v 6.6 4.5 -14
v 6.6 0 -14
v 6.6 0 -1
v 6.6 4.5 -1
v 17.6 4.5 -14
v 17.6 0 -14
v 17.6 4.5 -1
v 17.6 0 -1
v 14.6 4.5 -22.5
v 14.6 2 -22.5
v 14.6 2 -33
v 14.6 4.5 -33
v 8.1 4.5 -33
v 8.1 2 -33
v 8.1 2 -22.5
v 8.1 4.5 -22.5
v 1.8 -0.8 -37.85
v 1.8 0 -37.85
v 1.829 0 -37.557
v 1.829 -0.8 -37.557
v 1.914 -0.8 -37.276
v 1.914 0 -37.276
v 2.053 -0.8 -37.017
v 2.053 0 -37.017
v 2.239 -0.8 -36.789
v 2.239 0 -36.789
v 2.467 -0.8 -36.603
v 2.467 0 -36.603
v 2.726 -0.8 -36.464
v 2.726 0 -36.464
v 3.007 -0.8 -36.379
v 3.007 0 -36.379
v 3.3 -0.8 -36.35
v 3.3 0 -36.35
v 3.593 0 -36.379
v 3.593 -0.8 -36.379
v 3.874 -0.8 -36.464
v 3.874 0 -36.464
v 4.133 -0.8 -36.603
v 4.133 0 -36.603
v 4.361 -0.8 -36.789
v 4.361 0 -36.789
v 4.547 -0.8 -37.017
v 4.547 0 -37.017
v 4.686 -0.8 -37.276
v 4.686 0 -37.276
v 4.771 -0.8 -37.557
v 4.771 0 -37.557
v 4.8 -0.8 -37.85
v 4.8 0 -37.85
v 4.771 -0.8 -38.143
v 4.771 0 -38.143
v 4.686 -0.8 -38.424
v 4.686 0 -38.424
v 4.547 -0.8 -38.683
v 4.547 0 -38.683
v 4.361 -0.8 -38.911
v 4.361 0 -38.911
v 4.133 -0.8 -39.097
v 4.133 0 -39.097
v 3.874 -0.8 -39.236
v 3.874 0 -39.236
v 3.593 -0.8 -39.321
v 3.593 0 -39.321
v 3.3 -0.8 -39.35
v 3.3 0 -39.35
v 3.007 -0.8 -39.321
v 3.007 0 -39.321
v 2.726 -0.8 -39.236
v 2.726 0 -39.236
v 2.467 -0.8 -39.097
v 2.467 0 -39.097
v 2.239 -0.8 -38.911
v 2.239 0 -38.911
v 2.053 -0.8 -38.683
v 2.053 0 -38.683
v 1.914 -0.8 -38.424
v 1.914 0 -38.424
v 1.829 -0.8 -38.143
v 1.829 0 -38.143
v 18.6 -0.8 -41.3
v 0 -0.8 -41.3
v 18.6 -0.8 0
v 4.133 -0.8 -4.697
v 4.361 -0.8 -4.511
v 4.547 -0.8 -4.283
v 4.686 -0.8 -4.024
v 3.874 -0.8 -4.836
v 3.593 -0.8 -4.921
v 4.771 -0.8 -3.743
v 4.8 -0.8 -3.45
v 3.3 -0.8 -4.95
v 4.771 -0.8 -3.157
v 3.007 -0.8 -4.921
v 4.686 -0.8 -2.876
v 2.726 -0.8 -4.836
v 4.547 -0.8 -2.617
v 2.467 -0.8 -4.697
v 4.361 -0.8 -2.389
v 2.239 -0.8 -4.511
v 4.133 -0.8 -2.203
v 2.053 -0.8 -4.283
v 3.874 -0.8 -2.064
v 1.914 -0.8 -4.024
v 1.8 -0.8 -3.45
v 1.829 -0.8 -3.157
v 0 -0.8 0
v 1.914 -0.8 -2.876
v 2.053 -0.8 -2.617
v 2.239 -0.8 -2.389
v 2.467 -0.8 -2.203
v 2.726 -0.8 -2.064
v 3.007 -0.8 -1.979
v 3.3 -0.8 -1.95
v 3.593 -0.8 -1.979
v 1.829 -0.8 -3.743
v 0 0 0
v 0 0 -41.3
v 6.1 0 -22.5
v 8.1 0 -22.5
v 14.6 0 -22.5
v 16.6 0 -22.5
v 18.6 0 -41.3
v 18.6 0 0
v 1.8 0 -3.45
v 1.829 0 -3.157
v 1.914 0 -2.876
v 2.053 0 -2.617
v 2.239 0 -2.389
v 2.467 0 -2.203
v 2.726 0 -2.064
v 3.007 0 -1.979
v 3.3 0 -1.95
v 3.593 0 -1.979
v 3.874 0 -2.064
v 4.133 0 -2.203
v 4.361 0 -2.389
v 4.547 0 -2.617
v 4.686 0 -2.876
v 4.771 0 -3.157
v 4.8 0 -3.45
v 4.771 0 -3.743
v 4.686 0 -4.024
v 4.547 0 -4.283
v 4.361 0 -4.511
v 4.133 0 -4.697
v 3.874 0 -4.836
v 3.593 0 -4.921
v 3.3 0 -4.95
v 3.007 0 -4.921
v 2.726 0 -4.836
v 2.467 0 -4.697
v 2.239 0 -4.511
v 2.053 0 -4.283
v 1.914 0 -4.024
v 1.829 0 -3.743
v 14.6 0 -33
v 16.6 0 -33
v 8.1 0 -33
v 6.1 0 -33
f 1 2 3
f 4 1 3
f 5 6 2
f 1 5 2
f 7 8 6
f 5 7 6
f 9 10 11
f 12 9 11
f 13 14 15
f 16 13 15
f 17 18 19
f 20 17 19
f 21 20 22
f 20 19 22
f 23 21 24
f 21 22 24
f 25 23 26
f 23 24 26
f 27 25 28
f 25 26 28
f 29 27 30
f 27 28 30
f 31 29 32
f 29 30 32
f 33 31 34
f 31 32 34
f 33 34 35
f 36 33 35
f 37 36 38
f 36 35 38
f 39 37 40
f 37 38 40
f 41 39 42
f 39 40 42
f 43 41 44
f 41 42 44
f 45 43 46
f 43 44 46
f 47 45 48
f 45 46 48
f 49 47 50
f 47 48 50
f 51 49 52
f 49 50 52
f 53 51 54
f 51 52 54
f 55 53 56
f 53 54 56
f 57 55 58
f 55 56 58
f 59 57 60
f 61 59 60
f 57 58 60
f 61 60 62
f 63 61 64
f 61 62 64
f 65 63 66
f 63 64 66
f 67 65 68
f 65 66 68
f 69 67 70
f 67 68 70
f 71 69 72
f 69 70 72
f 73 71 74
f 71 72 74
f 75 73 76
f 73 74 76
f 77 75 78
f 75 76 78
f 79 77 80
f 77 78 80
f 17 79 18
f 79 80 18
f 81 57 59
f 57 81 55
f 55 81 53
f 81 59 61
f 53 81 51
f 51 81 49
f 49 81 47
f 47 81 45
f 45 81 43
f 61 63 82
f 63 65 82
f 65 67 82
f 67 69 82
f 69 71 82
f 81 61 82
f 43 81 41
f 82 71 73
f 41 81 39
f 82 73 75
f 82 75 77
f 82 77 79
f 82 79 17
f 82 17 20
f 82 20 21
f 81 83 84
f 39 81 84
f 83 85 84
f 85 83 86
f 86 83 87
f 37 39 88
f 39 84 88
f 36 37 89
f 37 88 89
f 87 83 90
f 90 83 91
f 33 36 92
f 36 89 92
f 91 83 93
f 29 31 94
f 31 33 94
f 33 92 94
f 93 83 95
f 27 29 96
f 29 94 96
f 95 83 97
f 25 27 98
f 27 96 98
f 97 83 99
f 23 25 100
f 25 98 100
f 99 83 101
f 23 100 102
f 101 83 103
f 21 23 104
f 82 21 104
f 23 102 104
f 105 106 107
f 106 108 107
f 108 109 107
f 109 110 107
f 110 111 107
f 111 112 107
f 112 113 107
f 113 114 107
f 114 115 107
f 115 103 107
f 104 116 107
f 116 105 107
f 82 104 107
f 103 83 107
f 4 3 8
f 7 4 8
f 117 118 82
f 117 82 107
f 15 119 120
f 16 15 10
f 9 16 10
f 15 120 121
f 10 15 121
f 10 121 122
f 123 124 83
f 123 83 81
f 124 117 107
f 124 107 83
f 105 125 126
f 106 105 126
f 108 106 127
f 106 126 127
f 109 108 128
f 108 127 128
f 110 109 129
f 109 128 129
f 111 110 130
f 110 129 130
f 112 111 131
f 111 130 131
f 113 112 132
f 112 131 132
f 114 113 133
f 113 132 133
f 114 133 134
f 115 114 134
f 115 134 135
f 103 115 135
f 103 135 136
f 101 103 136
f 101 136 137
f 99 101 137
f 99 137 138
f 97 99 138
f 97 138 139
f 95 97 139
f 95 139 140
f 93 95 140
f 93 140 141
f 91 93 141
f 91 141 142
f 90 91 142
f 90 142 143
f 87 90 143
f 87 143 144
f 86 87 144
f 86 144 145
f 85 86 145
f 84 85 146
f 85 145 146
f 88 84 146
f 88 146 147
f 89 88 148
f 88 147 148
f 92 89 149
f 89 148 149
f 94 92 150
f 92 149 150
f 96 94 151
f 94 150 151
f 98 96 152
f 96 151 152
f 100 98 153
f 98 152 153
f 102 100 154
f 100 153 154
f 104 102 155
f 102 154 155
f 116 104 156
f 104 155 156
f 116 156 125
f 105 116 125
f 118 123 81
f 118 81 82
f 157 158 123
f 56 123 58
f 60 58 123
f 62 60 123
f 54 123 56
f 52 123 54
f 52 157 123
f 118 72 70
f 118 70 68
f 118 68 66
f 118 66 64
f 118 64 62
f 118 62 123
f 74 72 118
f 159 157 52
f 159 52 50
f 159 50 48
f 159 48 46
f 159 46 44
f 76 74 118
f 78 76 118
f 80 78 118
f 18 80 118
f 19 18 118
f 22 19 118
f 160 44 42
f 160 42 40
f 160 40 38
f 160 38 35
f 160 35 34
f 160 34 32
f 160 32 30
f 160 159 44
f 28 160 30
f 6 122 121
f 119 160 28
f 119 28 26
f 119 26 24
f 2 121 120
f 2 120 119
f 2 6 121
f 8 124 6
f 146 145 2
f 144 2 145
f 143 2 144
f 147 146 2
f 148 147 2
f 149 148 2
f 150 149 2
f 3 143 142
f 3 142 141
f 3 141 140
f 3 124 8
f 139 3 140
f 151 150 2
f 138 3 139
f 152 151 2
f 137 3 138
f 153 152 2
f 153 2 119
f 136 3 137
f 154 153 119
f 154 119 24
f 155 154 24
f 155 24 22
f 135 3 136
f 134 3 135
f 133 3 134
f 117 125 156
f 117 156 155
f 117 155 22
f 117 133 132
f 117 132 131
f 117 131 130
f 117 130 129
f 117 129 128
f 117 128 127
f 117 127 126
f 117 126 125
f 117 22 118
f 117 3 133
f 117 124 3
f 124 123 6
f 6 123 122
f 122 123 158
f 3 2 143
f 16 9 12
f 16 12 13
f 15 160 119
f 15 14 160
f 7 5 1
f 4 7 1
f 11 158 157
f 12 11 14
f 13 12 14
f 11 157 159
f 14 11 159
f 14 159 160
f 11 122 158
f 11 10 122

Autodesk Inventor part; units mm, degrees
ref_plane "YZ Plane" through (0, 0, 0) normal (1, 0, 0) x (0, 1, 0)
ref_plane "XZ Plane" through (0, 0, 0) normal (0, 1, 0) x (-1, 0, 0)
ref_plane "XY Plane" through (0, 0, 0) normal (0, 0, 1) x (1, 0, 0)
sketch "Sketch1" plane through (0, 0, 0) normal (0, 1, 0) x (-1, 0, 0)
  line L0 (0, 0) -> (-18.6, 0)
  line L1 (-18.6, 0) -> (-18.6, -41.3)
  line L2 (-18.6, -41.3) -> (0, -41.3)
  line L3 (0, -41.3) -> (0, 0)
  line L4 (-1.8, 0) -> (-1.8, -41.3)
  line L5 (0, -39.35) -> (-18.6, -39.35)
  circle A0 centre (-3.3, -3.45) radius 1.5
  circle A1 centre (-3.3, -37.85) radius 1.5
  line L6 (-8.1, -22.5) -> (-14.6, -22.5)
  line L7 (-14.6, -22.5) -> (-14.6, -33)
  line L8 (-14.6, -33) -> (-8.1, -33)
  line L9 (-8.1, -33) -> (-8.1, -22.5)
  line L10 (-6.6, -1) -> (-17.6, -1)
  line L11 (-17.6, -1) -> (-17.6, -14)
  line L12 (-17.6, -14) -> (-6.6, -14)
  line L13 (-6.6, -14) -> (-6.6, -1)
  line L14 (0, -1.95) -> (-18.6, -1.95)
  dimension "d0" = 18.6
  dimension "d1" = 41.3
  dimension "d2" = 1.8
  dimension "d4" = 1.95
  dimension "d5" = 3
  dimension "d6" = 3
  dimension "d7" = 6.5
  dimension "d8" = 10.5
  dimension "d11" = 8.1
  dimension "d12" = 8.3
  dimension "d13" = 11
  dimension "d14" = 13
  dimension "d16" = 1
  dimension "d17" = 1
  dimension "d27" = 1.95
extrude "Extrusion1" add sketch "Sketch1" against normal blind 0.8 contours L3 L14 L4 L0 | L4 L14 L13 L10 L11 L1 L0 | L3 L5 L4 L14 | L4 A0 L14 | L3 L2 L4 L5 | L14 L11 L12 L13 A0 L4 A1 L5 L1 | L5 A1 L4 | L4 L2 L1 L5 | L14 L13 L12 L11 | L11 L10 L13 L14 | L9 L8 L7 L6
extrude "Extrusion2" add sketch "Sketch1" along normal blind 4.5 contours L14 L13 L12 L11 | L11 L10 L13 L14
extrude "Extrusion3" add sketch "Sketch1" along normal blind 4.5 contours L9 L8 L7 L6
chamfer "Chamfer1" distance 2 angle 45 2 edges at (8.1, 0, -27.75) (14.6, 0, -27.75)
properties part number "interface_board"
